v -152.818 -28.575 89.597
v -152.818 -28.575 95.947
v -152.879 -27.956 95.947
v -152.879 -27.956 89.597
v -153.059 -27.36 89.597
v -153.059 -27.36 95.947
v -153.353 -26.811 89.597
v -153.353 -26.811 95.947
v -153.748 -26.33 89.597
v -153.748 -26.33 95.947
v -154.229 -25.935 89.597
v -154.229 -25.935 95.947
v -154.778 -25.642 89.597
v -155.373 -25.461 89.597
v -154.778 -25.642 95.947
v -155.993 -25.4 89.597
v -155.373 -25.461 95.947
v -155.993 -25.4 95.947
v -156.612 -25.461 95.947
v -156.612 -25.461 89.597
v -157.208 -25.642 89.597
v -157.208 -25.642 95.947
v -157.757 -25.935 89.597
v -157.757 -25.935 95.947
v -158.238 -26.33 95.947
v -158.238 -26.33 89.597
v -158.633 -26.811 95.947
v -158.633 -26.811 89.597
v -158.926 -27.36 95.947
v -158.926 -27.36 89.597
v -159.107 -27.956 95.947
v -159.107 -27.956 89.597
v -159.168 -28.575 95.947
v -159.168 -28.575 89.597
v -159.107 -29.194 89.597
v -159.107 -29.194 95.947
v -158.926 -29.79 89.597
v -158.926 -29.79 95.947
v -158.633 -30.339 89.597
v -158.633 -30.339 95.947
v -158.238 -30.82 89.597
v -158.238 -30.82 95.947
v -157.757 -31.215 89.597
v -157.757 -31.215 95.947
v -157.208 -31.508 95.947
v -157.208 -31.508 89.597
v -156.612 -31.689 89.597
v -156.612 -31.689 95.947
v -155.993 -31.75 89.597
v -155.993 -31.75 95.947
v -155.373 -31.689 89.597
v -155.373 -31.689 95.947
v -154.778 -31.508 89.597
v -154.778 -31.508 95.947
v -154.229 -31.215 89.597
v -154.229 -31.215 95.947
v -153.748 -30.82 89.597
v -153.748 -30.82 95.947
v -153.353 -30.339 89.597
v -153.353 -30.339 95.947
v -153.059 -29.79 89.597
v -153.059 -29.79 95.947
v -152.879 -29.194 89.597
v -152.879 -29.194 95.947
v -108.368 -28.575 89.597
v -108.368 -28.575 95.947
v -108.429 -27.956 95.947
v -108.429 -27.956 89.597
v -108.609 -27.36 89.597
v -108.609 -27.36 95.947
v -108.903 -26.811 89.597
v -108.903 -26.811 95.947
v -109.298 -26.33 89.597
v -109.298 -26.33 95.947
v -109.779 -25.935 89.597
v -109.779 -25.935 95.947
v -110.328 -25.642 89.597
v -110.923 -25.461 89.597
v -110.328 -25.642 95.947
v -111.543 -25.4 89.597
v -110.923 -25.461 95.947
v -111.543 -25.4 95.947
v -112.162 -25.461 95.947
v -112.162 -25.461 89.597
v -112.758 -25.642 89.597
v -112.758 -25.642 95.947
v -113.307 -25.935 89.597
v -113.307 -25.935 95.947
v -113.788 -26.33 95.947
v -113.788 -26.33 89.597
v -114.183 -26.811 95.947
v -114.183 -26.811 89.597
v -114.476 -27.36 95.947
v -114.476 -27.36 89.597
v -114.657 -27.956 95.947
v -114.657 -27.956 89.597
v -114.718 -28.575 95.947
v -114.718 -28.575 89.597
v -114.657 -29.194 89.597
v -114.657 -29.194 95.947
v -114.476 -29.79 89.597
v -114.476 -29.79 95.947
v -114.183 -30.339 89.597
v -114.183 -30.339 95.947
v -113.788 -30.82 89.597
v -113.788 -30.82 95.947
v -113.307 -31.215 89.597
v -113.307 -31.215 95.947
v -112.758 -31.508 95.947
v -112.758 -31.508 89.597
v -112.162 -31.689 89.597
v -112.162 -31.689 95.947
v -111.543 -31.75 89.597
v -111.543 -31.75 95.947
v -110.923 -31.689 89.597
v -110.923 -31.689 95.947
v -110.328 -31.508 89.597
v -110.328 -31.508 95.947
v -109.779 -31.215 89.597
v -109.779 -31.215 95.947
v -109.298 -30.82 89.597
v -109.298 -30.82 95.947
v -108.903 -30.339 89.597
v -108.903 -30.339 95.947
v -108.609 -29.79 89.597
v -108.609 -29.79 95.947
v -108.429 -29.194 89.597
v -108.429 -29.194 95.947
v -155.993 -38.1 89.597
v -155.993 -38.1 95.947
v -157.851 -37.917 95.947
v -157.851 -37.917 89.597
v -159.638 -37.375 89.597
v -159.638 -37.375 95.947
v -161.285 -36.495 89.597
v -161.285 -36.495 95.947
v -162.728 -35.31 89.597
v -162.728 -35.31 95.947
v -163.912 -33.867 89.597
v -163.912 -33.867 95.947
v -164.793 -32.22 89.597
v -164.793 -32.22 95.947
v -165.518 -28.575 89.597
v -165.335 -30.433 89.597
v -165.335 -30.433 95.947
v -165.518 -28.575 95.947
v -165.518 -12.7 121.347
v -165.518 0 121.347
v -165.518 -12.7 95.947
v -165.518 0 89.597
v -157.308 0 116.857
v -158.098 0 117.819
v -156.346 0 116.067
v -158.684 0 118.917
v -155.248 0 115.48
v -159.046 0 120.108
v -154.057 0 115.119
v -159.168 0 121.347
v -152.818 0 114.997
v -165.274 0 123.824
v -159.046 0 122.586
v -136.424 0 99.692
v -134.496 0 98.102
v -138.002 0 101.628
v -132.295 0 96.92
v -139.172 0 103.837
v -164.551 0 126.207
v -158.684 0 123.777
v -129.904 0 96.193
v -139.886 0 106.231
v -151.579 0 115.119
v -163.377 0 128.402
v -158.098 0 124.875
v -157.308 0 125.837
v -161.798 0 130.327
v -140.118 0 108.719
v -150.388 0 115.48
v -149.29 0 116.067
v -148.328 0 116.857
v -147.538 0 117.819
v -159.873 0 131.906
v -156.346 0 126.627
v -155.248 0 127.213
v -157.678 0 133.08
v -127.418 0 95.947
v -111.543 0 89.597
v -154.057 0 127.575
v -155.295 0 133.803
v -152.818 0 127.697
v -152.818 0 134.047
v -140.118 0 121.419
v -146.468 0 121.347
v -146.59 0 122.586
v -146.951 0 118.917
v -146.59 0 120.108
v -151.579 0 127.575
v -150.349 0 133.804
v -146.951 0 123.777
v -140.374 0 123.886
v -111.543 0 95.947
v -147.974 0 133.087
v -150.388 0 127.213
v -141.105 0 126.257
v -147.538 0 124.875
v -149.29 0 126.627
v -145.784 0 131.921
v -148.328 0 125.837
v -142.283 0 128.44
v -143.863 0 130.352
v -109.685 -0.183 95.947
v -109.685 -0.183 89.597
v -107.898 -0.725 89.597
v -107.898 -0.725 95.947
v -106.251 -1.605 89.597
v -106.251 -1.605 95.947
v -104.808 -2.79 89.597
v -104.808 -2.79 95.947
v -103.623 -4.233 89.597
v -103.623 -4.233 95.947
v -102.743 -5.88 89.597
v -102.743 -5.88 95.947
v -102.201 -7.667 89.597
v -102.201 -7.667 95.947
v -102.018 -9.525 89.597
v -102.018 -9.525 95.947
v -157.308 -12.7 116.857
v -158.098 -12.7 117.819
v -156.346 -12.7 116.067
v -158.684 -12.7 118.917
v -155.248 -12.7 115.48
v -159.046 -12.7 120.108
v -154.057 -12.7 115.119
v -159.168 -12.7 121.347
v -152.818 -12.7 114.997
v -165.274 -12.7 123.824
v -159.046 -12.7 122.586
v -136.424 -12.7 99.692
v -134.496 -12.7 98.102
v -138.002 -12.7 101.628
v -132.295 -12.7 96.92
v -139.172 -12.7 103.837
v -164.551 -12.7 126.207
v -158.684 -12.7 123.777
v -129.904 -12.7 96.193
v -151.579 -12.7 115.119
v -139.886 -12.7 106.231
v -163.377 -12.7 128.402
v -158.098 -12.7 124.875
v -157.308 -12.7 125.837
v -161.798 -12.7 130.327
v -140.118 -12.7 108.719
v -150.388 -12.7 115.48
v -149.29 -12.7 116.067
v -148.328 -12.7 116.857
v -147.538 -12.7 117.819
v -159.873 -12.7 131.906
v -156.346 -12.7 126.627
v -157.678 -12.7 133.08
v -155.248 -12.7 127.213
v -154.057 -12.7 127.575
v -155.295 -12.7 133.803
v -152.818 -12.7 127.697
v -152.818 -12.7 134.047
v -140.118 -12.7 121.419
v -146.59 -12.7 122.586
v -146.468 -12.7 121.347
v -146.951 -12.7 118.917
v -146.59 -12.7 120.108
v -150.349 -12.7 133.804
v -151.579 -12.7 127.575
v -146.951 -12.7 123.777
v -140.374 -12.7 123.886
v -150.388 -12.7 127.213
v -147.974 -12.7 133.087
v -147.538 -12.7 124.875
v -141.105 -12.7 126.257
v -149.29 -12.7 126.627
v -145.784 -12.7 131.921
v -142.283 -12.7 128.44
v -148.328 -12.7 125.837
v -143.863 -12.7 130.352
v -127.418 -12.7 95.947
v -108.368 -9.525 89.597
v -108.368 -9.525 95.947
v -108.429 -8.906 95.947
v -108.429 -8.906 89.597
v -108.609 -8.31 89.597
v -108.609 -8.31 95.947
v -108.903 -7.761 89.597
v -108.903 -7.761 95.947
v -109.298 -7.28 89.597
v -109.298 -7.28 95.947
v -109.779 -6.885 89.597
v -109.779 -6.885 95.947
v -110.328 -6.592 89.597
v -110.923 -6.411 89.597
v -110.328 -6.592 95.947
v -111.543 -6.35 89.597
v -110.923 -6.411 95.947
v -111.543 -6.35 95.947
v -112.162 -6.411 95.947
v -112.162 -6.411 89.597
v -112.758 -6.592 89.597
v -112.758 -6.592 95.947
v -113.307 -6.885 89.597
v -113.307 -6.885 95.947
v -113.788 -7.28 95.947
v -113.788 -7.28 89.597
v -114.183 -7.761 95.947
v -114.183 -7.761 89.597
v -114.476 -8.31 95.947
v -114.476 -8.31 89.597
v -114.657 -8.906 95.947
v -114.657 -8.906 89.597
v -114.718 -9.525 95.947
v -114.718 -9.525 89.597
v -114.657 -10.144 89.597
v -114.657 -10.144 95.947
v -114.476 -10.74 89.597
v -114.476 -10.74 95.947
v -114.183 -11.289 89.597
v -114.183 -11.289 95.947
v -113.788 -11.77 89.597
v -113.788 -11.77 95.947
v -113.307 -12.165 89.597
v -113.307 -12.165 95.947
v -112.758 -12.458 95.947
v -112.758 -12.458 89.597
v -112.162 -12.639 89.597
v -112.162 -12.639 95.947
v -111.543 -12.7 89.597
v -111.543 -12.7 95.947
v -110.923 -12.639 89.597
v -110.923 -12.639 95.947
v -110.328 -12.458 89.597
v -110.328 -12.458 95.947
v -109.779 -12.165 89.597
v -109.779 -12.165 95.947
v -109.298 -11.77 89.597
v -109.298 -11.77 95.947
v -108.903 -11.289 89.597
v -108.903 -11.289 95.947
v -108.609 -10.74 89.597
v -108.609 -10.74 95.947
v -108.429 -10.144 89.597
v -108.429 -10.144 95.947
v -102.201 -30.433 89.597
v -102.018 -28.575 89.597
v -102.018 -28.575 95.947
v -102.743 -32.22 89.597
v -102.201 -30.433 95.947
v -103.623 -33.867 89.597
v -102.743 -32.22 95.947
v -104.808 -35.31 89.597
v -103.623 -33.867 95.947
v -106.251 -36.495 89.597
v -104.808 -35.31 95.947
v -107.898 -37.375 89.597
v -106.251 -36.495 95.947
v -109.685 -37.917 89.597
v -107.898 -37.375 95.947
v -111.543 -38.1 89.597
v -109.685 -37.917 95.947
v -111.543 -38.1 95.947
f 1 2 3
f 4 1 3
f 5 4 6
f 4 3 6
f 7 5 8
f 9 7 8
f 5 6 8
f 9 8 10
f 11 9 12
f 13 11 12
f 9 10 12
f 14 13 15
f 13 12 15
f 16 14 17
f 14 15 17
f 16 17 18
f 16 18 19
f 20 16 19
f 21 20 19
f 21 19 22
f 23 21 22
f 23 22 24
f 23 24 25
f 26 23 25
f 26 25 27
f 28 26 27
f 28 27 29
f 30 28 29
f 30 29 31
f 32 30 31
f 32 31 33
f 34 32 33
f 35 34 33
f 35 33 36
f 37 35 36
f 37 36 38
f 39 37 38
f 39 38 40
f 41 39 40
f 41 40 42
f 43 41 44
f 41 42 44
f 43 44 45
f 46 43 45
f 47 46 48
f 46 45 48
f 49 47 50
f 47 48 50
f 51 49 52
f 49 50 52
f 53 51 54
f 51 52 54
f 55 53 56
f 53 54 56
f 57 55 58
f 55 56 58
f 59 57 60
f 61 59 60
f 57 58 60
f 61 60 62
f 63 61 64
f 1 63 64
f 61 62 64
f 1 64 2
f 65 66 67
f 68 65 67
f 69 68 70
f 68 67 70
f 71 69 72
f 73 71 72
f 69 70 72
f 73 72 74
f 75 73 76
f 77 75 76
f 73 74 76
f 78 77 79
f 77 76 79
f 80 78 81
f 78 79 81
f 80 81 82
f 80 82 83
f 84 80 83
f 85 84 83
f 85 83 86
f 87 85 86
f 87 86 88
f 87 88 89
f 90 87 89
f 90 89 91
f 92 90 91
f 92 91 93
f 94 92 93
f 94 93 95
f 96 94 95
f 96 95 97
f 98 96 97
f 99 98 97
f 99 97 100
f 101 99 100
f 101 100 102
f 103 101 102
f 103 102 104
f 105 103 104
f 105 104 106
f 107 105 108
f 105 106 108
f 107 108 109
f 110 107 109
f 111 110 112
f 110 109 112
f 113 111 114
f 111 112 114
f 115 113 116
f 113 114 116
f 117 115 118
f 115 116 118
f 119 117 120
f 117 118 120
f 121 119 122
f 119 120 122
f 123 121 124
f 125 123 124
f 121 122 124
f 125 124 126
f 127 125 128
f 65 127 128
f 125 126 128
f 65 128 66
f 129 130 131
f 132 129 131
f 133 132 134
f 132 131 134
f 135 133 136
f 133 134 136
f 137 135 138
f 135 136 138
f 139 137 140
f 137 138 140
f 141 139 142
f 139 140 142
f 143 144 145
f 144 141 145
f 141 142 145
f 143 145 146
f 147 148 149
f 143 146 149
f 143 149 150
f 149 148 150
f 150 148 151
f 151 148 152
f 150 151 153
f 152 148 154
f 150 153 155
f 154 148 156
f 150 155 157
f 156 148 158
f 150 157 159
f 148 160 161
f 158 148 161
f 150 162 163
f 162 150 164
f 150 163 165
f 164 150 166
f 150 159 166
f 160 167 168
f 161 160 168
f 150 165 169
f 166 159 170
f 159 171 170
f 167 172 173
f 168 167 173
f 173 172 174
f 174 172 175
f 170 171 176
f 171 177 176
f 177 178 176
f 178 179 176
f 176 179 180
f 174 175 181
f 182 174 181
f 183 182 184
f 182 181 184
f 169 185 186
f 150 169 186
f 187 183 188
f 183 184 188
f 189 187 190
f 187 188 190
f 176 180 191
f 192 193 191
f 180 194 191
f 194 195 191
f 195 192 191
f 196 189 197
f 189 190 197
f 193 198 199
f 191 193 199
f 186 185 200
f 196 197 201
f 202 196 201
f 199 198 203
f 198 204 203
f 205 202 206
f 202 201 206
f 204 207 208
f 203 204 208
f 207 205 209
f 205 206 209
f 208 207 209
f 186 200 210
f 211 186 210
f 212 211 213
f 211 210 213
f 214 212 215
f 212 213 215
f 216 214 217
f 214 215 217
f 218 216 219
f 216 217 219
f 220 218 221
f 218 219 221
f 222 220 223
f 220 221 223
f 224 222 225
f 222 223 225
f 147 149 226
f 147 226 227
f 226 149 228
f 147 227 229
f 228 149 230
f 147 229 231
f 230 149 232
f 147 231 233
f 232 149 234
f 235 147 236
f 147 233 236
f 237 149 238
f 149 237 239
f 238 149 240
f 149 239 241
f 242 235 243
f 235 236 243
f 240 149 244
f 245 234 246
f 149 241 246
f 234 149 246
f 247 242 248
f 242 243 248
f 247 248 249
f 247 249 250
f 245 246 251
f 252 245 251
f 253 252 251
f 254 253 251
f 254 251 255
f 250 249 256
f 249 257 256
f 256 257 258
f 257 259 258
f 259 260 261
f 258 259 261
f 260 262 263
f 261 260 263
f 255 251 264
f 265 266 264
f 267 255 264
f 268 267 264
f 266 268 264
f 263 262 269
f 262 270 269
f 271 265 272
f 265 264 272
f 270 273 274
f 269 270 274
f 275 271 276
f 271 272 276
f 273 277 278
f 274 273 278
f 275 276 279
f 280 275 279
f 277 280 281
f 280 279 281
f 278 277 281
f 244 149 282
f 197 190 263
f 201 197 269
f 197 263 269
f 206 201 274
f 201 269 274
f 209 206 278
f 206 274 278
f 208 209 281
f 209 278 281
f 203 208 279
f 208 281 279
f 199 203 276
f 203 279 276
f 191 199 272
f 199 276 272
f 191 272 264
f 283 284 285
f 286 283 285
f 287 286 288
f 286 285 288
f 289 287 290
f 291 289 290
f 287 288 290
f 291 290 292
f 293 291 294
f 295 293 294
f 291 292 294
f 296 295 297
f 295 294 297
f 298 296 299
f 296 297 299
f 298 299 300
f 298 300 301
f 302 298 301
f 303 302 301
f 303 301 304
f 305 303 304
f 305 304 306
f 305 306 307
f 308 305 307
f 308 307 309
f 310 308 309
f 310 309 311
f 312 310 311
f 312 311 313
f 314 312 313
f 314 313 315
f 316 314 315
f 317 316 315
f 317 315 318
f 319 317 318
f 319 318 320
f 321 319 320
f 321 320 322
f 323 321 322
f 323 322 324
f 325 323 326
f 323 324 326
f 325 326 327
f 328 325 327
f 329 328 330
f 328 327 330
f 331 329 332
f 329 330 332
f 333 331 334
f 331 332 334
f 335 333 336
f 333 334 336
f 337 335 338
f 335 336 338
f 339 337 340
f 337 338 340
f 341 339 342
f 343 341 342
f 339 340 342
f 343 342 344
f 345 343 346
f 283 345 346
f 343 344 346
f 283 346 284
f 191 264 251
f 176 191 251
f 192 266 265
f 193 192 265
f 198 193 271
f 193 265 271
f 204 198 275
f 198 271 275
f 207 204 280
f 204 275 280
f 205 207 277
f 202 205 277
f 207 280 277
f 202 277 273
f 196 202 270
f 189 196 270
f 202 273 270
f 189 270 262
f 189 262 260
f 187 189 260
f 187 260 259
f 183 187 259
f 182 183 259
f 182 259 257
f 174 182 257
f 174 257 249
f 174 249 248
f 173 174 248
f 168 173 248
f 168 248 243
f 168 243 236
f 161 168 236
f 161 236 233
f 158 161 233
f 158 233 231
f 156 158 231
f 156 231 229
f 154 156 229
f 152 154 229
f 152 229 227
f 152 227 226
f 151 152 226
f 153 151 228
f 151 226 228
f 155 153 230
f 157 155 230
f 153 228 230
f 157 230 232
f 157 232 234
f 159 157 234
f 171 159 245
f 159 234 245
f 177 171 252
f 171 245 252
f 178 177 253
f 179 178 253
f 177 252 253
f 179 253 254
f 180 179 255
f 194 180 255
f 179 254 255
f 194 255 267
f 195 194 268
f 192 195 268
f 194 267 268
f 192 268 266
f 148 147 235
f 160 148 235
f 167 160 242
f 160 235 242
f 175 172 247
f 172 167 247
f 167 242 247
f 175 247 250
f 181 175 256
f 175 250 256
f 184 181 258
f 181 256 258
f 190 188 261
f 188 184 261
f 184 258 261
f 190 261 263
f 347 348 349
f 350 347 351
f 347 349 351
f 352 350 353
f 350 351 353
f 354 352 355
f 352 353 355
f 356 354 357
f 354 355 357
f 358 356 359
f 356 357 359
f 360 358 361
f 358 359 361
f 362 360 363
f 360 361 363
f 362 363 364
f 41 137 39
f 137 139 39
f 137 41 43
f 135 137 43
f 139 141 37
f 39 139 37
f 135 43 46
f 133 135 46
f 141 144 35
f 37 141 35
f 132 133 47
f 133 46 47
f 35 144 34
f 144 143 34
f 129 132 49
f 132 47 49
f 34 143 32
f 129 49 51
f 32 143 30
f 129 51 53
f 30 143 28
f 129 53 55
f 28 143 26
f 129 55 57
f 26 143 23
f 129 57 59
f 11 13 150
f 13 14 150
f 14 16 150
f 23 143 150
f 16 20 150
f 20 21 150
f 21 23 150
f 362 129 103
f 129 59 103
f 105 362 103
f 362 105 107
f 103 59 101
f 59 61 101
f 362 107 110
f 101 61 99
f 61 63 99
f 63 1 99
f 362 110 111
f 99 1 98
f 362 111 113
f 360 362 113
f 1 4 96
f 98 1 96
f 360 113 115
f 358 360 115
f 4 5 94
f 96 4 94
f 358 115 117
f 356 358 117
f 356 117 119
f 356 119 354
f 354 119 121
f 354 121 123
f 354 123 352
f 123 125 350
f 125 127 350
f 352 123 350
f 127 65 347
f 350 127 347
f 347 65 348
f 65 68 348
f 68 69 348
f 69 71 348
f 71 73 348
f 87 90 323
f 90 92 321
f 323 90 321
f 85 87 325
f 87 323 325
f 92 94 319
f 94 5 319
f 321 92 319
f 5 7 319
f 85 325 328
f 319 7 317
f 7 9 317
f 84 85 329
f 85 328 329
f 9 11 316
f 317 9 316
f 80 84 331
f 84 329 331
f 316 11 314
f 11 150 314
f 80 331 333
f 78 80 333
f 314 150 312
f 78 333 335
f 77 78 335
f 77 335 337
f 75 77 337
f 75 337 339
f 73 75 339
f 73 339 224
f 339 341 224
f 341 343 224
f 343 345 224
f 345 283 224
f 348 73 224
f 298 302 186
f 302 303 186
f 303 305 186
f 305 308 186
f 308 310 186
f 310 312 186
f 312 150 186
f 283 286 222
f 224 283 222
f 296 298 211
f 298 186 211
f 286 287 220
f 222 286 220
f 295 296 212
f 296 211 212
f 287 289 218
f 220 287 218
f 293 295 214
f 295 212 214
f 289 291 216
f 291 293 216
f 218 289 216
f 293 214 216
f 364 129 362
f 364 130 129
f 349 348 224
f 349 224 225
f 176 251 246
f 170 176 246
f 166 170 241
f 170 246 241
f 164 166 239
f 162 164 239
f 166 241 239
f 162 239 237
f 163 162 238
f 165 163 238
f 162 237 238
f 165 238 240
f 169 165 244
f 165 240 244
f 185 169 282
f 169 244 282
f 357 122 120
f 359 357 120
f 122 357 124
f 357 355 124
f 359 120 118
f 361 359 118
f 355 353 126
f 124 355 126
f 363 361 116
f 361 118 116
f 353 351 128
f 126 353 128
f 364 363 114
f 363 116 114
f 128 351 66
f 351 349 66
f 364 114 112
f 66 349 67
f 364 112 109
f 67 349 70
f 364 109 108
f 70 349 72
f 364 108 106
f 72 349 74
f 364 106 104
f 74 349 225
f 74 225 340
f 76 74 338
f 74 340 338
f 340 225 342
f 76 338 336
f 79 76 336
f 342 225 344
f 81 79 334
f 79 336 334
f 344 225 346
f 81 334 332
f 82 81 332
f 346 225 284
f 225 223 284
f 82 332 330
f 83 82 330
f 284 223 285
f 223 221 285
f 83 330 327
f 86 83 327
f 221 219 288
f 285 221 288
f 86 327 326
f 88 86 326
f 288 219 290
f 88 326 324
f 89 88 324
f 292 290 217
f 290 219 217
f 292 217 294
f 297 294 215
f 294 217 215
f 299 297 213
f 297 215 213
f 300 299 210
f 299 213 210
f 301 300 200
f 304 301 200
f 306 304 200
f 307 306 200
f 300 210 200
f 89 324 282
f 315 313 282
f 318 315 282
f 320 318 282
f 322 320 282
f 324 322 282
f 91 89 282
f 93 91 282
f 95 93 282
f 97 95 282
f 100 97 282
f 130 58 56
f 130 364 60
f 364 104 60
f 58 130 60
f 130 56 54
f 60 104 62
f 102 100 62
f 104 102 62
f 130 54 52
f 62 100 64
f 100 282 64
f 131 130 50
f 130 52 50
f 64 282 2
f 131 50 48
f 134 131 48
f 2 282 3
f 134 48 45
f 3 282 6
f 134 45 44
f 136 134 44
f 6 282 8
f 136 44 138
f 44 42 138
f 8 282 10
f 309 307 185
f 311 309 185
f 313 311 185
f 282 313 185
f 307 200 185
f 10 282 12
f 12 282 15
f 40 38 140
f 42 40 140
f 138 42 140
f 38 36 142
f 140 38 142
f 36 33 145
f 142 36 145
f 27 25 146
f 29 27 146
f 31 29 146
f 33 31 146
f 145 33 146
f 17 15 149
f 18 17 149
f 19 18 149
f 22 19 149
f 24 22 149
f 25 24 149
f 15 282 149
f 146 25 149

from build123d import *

# Parameters (mm, degrees)
F1_DEPTH  = 38.1
F2_W      = 25.4
F2_H      = 38.1
F3_DEPTH  = 38.101
F4_R      = 6.35
F5_DEPTH  = 12.701
F7_DEPTH  = 12.701
F8_R      = 3.175
F9_DEPTH  = 6.351
F11_DEPTH = 6.351


with BuildPart() as f1:
    # F0 (on Front) → F1 (new body)
    with BuildSketch(Plane.XZ):
        Polygon((-127.4177515995, 134.0467518509), (-165.5177515995, 134.0467518509), (-165.5177515995, 89.5967518509), (-102.0177515995, 89.5967518509), (-102.0177515995, 95.9467518509), (-127.4177515995, 95.9467518509), align=None)
    extrude(amount=F1_DEPTH)

    # F2 (on face) → F3 (cut, through all)
    with BuildSketch(Plane.YZ.offset(-127.4177515995)):
        with Locations((-25.4, 114.9967518509)):
            Rectangle(F2_W, F2_H)
    extrude(amount=-F3_DEPTH, mode=Mode.SUBTRACT)

    # F4 (on face) → F5 (cut, through all)
    with BuildSketch(Plane.XZ.offset(12.7)):
        with Locations((-152.8177515995, 121.3467518509)):
            Circle(F4_R)
        with BuildLine():
            ThreePointArc((-165.5177515995, 121.3467518509), (-161.7980077206, 130.327007972), (-152.8177515995, 134.0467518509))
            Line((-152.8177515995, 134.0467518509), (-165.5177515995, 134.0467518509))
            Line((-165.5177515995, 134.0467518509), (-165.5177515995, 121.3467518509))
        make_face()
    extrude(amount=-F5_DEPTH, mode=Mode.SUBTRACT)

    # F6 (on face) → F7 (cut, through all)
    with BuildSketch(Plane.XZ.offset(12.7)):
        with BuildLine():
            ThreePointArc((-152.8177515995, 134.0467518509), (-143.8630113716, 130.3524515711), (-140.1179560774, 121.4188191659))
            Line((-140.1179560774, 121.4188191659), (-140.1177515995, 108.7188191676))
            ThreePointArc((-140.1177515995, 108.7188191676), (-136.423523409, 99.6919990849), (-127.4177515995, 95.9467518509))
            Line((-127.4177515995, 95.9467518509), (-127.4177515995, 134.0467518509))
            Line((-127.4177515995, 134.0467518509), (-152.8177515995, 134.0467518509))
        make_face()
    extrude(amount=-F7_DEPTH, mode=Mode.SUBTRACT)

    # F8 (on face) → F9 (cut, through all)
    with BuildSketch(Plane.XY.offset(95.9467518509)):
        with Locations((-155.9927515995, -28.575)):
            Circle(F8_R)
        with Locations((-111.5427515995, -28.575)):
            Circle(F8_R)
        with Locations((-111.5427515995, -9.525)):
            Circle(F8_R)
    extrude(amount=-F9_DEPTH, mode=Mode.SUBTRACT)

    # F10 (on face) → F11 (cut, through all)
    with BuildSketch(Plane.XY.offset(95.9467518509)):
        with BuildLine():
            ThreePointArc((-155.9927515995, -38.1), (-162.7279436903, -35.3101920908), (-165.5177515995, -28.575))
            Line((-165.5177515995, -28.575), (-165.5177515995, -38.1))
            Line((-165.5177515995, -38.1), (-155.9927515995, -38.1))
        make_face()
        with BuildLine():
            ThreePointArc((-102.0177515995, -28.575), (-104.8075595087, -35.3101920908), (-111.5427515995, -38.1))
            Line((-111.5427515995, -38.1), (-102.0177515995, -38.1))
            Line((-102.0177515995, -38.1), (-102.0177515995, -28.575))
        make_face()
        with BuildLine():
            Line((-102.0177515995, 0), (-111.5427515995, 0))
            ThreePointArc((-111.5427515995, 0), (-104.8075595087, -2.7898079092), (-102.0177515995, -9.525))
            Line((-102.0177515995, -9.525), (-102.0177515995, 0))
        make_face()
    extrude(amount=-F11_DEPTH, mode=Mode.SUBTRACT)


solid = f1.part
